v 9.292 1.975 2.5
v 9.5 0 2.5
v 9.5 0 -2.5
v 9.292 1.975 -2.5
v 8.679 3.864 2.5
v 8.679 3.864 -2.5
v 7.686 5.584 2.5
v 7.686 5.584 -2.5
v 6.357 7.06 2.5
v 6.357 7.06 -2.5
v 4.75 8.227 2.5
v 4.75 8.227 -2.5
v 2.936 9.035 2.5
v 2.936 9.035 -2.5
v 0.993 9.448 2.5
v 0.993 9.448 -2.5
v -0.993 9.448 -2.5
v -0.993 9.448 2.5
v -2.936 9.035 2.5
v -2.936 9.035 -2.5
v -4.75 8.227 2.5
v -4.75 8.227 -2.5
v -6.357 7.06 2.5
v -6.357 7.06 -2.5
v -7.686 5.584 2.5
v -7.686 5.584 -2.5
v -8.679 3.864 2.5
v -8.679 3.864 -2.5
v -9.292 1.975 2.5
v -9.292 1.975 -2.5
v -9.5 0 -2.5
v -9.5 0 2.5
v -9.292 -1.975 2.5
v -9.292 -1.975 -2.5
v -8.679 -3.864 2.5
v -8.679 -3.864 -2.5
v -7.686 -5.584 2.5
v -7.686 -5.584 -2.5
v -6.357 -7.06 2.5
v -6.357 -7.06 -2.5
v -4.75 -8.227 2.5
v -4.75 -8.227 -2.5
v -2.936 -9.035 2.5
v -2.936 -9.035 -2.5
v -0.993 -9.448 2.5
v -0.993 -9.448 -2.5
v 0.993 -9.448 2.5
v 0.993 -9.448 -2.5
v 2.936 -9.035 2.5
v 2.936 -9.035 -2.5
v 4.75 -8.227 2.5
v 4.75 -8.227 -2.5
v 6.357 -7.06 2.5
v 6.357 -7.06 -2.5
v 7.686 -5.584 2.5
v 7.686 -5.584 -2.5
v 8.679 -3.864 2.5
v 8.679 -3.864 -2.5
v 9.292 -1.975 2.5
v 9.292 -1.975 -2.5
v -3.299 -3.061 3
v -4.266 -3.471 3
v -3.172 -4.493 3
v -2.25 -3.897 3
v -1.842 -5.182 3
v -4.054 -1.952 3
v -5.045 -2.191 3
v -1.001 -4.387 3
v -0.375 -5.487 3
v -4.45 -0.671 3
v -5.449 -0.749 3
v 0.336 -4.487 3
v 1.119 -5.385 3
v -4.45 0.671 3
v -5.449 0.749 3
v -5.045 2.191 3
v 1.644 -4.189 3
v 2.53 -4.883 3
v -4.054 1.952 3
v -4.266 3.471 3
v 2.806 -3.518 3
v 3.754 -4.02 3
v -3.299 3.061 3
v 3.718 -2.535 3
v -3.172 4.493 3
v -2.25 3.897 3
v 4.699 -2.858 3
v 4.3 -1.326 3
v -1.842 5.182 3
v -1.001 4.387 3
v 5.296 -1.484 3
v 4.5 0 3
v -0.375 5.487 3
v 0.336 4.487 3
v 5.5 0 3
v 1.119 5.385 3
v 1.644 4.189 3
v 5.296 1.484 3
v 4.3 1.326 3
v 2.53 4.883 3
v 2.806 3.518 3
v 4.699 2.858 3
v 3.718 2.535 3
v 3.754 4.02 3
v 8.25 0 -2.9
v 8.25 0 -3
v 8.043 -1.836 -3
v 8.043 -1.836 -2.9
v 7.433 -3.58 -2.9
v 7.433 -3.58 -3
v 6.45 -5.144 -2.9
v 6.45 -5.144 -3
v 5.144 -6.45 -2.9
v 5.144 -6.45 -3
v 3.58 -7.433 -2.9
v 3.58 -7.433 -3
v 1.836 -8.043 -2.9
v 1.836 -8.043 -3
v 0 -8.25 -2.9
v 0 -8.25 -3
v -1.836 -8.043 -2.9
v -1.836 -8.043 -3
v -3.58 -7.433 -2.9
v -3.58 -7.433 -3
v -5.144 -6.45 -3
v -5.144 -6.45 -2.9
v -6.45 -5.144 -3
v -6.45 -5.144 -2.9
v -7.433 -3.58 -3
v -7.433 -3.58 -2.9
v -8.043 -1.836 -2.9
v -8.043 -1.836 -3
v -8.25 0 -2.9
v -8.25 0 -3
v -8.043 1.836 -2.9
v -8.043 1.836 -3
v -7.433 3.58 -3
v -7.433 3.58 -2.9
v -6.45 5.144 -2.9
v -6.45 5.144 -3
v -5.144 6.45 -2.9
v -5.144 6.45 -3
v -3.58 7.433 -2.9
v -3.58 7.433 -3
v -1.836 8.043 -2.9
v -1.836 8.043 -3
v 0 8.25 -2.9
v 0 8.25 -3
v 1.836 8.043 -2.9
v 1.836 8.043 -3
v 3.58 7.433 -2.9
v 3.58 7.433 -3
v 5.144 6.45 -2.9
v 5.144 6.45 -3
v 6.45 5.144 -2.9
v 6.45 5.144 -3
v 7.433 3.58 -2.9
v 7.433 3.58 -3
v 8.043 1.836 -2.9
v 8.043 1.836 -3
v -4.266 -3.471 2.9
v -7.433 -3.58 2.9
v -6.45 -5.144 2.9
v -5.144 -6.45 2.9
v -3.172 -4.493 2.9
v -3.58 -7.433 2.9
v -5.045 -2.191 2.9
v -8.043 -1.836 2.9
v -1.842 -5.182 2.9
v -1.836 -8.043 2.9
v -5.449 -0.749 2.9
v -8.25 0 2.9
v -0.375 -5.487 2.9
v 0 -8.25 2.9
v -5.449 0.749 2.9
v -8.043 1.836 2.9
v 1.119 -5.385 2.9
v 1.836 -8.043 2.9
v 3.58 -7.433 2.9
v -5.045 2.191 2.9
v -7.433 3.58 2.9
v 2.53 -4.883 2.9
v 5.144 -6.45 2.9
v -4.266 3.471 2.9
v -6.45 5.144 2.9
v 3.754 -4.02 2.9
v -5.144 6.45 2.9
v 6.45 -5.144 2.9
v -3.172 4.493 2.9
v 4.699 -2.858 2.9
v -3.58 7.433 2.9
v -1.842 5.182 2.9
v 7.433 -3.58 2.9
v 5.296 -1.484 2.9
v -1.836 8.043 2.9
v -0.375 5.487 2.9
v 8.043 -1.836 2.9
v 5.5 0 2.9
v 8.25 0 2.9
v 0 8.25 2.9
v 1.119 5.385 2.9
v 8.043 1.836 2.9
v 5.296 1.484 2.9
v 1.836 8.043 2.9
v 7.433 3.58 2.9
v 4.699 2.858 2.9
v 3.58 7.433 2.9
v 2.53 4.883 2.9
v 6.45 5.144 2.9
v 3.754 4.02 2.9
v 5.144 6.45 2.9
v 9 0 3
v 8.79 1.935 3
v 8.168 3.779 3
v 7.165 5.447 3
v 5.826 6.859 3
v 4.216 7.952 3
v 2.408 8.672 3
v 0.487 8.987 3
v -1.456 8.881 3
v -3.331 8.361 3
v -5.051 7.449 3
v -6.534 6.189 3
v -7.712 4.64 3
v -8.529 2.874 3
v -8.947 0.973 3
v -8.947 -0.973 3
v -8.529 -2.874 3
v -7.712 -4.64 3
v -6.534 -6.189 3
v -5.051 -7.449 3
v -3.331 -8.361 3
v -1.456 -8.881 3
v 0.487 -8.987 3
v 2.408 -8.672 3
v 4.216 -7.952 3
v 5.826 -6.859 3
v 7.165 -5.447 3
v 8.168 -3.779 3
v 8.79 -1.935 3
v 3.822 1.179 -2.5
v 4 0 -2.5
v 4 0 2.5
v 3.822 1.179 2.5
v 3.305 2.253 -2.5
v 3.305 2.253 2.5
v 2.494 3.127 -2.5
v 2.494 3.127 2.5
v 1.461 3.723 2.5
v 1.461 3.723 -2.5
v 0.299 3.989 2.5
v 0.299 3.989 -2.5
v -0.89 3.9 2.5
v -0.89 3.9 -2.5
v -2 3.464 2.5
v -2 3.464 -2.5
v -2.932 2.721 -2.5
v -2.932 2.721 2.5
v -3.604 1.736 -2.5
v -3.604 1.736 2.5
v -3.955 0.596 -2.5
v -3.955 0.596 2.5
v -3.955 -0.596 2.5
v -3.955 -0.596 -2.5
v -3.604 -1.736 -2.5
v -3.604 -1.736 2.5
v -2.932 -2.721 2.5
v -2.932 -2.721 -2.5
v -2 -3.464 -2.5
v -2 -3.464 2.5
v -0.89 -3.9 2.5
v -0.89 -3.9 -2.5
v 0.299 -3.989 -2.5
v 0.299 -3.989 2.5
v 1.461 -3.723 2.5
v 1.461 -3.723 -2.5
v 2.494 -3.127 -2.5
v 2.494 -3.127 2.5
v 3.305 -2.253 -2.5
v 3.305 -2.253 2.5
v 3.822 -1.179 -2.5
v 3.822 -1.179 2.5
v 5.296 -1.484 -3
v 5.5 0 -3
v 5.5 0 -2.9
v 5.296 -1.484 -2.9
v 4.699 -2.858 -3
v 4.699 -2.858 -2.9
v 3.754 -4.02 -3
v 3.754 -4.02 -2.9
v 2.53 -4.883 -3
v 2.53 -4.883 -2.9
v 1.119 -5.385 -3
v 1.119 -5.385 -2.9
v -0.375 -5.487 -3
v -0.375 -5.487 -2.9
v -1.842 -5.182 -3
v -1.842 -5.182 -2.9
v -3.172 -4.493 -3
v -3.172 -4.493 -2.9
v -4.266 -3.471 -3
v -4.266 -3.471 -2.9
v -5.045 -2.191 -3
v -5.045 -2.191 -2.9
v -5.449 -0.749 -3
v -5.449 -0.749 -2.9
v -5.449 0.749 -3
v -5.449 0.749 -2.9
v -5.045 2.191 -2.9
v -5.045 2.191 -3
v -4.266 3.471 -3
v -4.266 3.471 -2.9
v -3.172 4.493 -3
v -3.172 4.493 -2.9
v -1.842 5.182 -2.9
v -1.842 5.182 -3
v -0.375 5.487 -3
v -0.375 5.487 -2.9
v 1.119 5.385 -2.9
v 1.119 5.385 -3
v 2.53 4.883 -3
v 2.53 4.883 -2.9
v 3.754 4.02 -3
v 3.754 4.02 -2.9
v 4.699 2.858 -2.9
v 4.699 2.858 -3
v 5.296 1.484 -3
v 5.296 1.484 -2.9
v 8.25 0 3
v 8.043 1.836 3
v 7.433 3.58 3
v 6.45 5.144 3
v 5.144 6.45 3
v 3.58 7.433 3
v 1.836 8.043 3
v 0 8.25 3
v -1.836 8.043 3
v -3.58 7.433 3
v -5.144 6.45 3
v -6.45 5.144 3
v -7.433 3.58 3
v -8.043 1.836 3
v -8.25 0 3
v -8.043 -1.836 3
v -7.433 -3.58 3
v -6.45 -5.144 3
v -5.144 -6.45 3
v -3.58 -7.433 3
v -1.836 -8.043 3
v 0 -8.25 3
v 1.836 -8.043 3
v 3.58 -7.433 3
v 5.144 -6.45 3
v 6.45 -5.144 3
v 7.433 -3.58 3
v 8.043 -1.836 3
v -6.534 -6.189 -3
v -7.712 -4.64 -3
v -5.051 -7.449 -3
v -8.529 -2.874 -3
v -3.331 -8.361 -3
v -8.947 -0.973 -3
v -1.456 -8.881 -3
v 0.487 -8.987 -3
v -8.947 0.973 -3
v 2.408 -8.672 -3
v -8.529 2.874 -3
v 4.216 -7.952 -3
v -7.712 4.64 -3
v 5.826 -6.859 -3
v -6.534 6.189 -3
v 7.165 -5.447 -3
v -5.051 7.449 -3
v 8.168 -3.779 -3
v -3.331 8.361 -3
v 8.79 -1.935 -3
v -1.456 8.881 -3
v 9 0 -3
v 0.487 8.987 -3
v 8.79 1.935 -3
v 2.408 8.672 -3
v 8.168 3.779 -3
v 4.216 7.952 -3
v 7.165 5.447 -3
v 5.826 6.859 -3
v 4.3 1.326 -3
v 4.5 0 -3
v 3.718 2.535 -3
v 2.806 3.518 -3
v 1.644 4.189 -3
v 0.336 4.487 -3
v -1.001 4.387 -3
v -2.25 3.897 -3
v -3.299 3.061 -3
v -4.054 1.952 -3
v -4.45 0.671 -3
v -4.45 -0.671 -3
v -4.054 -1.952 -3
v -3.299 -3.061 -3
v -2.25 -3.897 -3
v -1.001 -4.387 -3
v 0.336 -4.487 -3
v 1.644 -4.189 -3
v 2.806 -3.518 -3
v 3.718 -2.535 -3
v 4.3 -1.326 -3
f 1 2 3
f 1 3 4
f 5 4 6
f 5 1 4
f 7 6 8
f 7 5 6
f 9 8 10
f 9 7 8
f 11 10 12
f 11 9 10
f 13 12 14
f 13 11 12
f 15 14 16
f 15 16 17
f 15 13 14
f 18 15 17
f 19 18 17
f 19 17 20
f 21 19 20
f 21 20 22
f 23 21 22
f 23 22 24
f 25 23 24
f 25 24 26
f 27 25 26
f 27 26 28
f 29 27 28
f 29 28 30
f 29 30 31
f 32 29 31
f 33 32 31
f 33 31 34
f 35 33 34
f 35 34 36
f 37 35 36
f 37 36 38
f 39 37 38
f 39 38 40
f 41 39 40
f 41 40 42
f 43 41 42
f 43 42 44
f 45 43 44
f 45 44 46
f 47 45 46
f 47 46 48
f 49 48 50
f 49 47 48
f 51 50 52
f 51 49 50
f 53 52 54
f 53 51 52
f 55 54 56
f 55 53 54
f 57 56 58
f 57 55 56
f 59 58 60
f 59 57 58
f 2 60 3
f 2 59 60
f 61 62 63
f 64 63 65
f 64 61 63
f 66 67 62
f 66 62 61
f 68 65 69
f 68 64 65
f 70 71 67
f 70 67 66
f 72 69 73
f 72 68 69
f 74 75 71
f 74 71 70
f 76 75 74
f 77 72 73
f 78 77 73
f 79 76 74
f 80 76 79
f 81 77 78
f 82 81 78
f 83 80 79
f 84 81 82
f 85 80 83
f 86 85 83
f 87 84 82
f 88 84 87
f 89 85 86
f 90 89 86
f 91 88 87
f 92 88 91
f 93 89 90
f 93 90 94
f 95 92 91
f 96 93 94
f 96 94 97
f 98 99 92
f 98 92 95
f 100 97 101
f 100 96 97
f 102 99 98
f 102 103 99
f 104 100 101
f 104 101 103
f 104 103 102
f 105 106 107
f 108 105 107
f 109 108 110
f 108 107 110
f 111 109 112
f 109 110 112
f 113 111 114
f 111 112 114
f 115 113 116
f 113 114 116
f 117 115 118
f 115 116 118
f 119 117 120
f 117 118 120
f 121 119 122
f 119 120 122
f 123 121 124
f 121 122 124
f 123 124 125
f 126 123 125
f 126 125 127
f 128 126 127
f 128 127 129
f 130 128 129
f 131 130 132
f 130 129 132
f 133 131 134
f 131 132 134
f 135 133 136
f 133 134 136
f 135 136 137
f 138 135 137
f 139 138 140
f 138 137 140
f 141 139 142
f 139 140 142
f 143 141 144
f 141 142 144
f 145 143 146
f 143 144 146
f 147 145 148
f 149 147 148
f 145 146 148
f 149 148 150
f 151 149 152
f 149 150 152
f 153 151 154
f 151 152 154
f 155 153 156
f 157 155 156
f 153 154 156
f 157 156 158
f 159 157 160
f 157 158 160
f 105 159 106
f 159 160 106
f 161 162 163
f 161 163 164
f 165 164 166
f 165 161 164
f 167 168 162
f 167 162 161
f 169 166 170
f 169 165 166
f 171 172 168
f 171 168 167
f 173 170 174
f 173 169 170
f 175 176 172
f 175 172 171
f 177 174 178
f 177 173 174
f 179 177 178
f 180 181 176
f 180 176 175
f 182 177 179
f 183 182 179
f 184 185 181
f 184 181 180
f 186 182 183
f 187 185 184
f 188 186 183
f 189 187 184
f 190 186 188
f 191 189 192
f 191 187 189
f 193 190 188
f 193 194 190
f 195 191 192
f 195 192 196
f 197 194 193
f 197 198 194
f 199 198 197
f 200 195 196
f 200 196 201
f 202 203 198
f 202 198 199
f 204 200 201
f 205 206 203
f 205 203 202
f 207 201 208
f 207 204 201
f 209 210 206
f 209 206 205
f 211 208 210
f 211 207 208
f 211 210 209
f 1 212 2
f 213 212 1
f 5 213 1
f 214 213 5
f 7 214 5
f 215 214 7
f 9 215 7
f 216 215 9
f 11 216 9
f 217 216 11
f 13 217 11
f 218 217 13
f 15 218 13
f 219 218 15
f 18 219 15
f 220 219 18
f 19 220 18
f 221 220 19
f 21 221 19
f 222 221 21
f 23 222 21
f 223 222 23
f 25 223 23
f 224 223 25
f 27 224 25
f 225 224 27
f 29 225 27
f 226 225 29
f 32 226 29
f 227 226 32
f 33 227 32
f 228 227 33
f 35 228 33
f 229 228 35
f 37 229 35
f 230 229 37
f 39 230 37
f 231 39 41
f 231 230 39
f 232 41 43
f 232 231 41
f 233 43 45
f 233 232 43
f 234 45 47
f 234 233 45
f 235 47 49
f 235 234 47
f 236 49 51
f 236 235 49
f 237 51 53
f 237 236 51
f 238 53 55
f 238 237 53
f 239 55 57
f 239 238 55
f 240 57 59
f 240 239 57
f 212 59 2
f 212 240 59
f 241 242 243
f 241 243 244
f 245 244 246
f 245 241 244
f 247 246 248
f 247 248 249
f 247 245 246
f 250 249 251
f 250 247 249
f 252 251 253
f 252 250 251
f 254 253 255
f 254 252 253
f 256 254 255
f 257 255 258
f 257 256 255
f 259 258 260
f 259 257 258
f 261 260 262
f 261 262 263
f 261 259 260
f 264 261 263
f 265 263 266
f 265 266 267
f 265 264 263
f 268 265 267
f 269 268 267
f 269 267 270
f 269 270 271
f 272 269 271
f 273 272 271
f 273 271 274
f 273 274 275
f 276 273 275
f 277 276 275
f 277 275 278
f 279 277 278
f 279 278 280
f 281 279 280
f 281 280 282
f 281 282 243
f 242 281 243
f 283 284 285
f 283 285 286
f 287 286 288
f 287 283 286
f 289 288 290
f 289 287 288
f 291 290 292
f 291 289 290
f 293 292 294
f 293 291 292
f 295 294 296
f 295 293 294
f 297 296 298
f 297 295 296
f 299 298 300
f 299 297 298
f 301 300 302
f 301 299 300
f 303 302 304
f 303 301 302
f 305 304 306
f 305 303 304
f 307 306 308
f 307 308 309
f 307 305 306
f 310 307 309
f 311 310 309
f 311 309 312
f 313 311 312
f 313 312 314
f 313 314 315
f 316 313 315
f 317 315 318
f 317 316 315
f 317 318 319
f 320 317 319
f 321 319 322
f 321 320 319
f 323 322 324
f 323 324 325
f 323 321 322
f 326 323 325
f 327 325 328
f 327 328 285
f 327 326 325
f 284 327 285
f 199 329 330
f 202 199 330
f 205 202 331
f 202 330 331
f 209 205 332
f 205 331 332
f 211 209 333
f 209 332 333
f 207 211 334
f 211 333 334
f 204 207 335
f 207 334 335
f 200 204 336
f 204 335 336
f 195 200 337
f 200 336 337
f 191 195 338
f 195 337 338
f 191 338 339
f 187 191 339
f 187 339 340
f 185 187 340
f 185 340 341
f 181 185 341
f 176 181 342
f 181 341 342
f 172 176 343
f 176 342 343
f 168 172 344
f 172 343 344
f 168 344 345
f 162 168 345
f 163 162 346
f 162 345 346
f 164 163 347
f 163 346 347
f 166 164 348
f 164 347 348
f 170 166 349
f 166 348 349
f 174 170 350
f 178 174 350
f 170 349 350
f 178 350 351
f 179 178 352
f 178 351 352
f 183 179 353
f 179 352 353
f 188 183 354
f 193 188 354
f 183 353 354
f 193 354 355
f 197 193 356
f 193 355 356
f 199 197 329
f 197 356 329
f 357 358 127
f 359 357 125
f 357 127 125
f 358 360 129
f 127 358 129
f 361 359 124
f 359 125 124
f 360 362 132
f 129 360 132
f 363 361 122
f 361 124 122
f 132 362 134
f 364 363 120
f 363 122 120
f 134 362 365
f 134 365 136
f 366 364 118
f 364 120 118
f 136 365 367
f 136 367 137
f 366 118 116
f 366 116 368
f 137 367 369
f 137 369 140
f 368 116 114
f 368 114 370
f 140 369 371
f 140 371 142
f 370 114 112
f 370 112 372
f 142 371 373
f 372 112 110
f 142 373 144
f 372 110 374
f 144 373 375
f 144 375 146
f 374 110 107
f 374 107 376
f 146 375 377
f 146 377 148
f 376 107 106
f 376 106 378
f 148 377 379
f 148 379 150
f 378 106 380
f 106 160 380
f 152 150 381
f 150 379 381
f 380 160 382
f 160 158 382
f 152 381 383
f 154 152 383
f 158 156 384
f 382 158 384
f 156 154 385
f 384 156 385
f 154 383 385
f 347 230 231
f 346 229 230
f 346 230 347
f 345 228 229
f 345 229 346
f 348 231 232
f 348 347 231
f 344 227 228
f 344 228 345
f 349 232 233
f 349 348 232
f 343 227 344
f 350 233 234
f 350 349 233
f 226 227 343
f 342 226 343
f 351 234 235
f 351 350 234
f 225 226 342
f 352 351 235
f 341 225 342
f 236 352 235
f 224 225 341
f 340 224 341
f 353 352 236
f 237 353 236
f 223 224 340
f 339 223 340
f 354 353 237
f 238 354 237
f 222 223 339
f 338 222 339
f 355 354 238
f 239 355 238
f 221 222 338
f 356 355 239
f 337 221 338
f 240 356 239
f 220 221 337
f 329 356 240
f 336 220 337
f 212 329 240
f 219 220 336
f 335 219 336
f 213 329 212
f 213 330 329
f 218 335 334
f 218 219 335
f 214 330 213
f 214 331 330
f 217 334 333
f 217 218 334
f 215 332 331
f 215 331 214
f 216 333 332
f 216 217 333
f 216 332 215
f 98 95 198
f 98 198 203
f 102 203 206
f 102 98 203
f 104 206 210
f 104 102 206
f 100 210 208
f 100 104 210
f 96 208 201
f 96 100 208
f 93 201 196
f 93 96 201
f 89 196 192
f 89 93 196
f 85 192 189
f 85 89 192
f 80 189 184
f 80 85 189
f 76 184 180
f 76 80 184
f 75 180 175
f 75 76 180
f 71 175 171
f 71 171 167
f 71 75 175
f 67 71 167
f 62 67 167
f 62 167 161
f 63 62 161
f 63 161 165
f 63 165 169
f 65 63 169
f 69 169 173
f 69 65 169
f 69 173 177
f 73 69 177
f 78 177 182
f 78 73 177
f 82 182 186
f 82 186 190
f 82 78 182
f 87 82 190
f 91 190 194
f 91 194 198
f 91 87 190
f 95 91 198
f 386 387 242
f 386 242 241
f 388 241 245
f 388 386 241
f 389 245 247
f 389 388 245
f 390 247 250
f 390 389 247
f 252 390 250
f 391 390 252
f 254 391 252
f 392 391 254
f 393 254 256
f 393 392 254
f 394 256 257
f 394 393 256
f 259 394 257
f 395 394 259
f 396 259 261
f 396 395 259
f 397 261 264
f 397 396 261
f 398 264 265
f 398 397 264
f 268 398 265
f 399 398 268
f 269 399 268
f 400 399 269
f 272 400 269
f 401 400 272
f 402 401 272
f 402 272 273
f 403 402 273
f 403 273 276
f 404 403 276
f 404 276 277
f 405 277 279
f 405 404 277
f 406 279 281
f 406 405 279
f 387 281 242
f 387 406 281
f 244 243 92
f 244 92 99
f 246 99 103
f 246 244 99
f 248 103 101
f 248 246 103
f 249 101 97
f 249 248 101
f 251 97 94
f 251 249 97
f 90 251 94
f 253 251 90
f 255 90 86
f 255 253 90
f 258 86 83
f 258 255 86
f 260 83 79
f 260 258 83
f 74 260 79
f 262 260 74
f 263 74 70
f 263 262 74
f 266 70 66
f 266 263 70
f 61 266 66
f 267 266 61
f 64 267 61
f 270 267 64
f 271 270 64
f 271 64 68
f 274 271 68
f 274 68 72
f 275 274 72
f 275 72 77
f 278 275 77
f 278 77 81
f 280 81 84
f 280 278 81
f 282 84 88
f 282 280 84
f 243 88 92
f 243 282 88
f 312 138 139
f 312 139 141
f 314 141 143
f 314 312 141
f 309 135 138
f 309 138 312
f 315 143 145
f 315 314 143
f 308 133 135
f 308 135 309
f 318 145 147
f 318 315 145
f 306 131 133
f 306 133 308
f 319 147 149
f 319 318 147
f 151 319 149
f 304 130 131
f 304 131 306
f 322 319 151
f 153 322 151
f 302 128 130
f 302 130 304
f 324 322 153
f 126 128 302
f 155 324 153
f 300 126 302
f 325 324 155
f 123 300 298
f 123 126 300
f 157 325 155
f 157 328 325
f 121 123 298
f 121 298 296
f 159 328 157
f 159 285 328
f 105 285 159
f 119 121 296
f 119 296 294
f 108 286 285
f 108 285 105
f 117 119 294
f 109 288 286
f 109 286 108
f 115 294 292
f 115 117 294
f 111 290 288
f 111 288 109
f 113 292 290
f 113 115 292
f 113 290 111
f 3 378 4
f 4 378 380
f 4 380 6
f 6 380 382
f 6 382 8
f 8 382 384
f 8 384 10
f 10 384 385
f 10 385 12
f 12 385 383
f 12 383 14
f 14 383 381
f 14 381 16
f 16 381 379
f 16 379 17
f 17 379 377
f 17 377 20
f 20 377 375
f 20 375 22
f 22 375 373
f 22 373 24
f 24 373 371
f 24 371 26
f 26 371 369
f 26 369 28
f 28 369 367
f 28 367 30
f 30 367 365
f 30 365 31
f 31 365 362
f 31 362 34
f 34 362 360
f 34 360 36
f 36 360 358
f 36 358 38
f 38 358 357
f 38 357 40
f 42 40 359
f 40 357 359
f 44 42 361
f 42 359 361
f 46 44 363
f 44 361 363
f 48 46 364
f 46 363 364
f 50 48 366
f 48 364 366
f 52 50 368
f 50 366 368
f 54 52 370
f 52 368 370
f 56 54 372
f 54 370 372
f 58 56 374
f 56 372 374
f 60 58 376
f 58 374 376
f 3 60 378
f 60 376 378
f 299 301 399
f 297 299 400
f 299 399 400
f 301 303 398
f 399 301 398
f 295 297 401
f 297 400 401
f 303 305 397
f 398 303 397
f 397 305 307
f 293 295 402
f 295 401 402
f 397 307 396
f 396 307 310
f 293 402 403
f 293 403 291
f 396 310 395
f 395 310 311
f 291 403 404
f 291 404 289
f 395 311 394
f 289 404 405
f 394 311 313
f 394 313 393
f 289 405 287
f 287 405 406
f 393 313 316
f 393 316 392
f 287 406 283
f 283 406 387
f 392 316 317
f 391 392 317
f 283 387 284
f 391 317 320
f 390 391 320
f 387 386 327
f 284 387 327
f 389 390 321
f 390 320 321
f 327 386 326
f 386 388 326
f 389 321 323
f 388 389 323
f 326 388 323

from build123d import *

# Parameters (mm, degrees)
F0_R     = 9.5
F0_R_2   = 4
F1_DEPTH = 3
F2_SIZE  = 0.5
F3_R     = 8.25
F3_R_2   = 5.5
F4_DEPTH = 0.1
F5_R     = 8.25
F5_R_2   = 5.5
F6_DEPTH = 0.1


with BuildPart() as f1:
    # F0 (on Top) → F1 (new body, symmetric)
    with BuildSketch(Plane.XY):
        Circle(F0_R)
        Circle(F0_R_2, mode=Mode.SUBTRACT)
    extrude(amount=F1_DEPTH, both=True)

    # F2
    f2_edges = [f1.edges().sort_by_distance(p)[0] for p in [
        (-9.5, 0, 3),
        (-4, 0, 3),
        (-9.5, 0, -3),
        (-4, 0, -3),
    ]]
    chamfer(f2_edges, length=F2_SIZE)

    # F3 (on face) → F4 (cut)
    with BuildSketch(Plane(origin=(0, 0, -3), x_dir=(1, 0, 0), z_dir=(0, 0, -1))):
        Circle(F3_R)
        Circle(F3_R_2, mode=Mode.SUBTRACT)
    extrude(amount=-F4_DEPTH, mode=Mode.SUBTRACT)

    # F5 (on face) → F6 (cut)
    with BuildSketch(Plane.XY.offset(3)):
        Circle(F5_R)
        Circle(F5_R_2, mode=Mode.SUBTRACT)
    extrude(amount=-F6_DEPTH, mode=Mode.SUBTRACT)


solid = f1.part
